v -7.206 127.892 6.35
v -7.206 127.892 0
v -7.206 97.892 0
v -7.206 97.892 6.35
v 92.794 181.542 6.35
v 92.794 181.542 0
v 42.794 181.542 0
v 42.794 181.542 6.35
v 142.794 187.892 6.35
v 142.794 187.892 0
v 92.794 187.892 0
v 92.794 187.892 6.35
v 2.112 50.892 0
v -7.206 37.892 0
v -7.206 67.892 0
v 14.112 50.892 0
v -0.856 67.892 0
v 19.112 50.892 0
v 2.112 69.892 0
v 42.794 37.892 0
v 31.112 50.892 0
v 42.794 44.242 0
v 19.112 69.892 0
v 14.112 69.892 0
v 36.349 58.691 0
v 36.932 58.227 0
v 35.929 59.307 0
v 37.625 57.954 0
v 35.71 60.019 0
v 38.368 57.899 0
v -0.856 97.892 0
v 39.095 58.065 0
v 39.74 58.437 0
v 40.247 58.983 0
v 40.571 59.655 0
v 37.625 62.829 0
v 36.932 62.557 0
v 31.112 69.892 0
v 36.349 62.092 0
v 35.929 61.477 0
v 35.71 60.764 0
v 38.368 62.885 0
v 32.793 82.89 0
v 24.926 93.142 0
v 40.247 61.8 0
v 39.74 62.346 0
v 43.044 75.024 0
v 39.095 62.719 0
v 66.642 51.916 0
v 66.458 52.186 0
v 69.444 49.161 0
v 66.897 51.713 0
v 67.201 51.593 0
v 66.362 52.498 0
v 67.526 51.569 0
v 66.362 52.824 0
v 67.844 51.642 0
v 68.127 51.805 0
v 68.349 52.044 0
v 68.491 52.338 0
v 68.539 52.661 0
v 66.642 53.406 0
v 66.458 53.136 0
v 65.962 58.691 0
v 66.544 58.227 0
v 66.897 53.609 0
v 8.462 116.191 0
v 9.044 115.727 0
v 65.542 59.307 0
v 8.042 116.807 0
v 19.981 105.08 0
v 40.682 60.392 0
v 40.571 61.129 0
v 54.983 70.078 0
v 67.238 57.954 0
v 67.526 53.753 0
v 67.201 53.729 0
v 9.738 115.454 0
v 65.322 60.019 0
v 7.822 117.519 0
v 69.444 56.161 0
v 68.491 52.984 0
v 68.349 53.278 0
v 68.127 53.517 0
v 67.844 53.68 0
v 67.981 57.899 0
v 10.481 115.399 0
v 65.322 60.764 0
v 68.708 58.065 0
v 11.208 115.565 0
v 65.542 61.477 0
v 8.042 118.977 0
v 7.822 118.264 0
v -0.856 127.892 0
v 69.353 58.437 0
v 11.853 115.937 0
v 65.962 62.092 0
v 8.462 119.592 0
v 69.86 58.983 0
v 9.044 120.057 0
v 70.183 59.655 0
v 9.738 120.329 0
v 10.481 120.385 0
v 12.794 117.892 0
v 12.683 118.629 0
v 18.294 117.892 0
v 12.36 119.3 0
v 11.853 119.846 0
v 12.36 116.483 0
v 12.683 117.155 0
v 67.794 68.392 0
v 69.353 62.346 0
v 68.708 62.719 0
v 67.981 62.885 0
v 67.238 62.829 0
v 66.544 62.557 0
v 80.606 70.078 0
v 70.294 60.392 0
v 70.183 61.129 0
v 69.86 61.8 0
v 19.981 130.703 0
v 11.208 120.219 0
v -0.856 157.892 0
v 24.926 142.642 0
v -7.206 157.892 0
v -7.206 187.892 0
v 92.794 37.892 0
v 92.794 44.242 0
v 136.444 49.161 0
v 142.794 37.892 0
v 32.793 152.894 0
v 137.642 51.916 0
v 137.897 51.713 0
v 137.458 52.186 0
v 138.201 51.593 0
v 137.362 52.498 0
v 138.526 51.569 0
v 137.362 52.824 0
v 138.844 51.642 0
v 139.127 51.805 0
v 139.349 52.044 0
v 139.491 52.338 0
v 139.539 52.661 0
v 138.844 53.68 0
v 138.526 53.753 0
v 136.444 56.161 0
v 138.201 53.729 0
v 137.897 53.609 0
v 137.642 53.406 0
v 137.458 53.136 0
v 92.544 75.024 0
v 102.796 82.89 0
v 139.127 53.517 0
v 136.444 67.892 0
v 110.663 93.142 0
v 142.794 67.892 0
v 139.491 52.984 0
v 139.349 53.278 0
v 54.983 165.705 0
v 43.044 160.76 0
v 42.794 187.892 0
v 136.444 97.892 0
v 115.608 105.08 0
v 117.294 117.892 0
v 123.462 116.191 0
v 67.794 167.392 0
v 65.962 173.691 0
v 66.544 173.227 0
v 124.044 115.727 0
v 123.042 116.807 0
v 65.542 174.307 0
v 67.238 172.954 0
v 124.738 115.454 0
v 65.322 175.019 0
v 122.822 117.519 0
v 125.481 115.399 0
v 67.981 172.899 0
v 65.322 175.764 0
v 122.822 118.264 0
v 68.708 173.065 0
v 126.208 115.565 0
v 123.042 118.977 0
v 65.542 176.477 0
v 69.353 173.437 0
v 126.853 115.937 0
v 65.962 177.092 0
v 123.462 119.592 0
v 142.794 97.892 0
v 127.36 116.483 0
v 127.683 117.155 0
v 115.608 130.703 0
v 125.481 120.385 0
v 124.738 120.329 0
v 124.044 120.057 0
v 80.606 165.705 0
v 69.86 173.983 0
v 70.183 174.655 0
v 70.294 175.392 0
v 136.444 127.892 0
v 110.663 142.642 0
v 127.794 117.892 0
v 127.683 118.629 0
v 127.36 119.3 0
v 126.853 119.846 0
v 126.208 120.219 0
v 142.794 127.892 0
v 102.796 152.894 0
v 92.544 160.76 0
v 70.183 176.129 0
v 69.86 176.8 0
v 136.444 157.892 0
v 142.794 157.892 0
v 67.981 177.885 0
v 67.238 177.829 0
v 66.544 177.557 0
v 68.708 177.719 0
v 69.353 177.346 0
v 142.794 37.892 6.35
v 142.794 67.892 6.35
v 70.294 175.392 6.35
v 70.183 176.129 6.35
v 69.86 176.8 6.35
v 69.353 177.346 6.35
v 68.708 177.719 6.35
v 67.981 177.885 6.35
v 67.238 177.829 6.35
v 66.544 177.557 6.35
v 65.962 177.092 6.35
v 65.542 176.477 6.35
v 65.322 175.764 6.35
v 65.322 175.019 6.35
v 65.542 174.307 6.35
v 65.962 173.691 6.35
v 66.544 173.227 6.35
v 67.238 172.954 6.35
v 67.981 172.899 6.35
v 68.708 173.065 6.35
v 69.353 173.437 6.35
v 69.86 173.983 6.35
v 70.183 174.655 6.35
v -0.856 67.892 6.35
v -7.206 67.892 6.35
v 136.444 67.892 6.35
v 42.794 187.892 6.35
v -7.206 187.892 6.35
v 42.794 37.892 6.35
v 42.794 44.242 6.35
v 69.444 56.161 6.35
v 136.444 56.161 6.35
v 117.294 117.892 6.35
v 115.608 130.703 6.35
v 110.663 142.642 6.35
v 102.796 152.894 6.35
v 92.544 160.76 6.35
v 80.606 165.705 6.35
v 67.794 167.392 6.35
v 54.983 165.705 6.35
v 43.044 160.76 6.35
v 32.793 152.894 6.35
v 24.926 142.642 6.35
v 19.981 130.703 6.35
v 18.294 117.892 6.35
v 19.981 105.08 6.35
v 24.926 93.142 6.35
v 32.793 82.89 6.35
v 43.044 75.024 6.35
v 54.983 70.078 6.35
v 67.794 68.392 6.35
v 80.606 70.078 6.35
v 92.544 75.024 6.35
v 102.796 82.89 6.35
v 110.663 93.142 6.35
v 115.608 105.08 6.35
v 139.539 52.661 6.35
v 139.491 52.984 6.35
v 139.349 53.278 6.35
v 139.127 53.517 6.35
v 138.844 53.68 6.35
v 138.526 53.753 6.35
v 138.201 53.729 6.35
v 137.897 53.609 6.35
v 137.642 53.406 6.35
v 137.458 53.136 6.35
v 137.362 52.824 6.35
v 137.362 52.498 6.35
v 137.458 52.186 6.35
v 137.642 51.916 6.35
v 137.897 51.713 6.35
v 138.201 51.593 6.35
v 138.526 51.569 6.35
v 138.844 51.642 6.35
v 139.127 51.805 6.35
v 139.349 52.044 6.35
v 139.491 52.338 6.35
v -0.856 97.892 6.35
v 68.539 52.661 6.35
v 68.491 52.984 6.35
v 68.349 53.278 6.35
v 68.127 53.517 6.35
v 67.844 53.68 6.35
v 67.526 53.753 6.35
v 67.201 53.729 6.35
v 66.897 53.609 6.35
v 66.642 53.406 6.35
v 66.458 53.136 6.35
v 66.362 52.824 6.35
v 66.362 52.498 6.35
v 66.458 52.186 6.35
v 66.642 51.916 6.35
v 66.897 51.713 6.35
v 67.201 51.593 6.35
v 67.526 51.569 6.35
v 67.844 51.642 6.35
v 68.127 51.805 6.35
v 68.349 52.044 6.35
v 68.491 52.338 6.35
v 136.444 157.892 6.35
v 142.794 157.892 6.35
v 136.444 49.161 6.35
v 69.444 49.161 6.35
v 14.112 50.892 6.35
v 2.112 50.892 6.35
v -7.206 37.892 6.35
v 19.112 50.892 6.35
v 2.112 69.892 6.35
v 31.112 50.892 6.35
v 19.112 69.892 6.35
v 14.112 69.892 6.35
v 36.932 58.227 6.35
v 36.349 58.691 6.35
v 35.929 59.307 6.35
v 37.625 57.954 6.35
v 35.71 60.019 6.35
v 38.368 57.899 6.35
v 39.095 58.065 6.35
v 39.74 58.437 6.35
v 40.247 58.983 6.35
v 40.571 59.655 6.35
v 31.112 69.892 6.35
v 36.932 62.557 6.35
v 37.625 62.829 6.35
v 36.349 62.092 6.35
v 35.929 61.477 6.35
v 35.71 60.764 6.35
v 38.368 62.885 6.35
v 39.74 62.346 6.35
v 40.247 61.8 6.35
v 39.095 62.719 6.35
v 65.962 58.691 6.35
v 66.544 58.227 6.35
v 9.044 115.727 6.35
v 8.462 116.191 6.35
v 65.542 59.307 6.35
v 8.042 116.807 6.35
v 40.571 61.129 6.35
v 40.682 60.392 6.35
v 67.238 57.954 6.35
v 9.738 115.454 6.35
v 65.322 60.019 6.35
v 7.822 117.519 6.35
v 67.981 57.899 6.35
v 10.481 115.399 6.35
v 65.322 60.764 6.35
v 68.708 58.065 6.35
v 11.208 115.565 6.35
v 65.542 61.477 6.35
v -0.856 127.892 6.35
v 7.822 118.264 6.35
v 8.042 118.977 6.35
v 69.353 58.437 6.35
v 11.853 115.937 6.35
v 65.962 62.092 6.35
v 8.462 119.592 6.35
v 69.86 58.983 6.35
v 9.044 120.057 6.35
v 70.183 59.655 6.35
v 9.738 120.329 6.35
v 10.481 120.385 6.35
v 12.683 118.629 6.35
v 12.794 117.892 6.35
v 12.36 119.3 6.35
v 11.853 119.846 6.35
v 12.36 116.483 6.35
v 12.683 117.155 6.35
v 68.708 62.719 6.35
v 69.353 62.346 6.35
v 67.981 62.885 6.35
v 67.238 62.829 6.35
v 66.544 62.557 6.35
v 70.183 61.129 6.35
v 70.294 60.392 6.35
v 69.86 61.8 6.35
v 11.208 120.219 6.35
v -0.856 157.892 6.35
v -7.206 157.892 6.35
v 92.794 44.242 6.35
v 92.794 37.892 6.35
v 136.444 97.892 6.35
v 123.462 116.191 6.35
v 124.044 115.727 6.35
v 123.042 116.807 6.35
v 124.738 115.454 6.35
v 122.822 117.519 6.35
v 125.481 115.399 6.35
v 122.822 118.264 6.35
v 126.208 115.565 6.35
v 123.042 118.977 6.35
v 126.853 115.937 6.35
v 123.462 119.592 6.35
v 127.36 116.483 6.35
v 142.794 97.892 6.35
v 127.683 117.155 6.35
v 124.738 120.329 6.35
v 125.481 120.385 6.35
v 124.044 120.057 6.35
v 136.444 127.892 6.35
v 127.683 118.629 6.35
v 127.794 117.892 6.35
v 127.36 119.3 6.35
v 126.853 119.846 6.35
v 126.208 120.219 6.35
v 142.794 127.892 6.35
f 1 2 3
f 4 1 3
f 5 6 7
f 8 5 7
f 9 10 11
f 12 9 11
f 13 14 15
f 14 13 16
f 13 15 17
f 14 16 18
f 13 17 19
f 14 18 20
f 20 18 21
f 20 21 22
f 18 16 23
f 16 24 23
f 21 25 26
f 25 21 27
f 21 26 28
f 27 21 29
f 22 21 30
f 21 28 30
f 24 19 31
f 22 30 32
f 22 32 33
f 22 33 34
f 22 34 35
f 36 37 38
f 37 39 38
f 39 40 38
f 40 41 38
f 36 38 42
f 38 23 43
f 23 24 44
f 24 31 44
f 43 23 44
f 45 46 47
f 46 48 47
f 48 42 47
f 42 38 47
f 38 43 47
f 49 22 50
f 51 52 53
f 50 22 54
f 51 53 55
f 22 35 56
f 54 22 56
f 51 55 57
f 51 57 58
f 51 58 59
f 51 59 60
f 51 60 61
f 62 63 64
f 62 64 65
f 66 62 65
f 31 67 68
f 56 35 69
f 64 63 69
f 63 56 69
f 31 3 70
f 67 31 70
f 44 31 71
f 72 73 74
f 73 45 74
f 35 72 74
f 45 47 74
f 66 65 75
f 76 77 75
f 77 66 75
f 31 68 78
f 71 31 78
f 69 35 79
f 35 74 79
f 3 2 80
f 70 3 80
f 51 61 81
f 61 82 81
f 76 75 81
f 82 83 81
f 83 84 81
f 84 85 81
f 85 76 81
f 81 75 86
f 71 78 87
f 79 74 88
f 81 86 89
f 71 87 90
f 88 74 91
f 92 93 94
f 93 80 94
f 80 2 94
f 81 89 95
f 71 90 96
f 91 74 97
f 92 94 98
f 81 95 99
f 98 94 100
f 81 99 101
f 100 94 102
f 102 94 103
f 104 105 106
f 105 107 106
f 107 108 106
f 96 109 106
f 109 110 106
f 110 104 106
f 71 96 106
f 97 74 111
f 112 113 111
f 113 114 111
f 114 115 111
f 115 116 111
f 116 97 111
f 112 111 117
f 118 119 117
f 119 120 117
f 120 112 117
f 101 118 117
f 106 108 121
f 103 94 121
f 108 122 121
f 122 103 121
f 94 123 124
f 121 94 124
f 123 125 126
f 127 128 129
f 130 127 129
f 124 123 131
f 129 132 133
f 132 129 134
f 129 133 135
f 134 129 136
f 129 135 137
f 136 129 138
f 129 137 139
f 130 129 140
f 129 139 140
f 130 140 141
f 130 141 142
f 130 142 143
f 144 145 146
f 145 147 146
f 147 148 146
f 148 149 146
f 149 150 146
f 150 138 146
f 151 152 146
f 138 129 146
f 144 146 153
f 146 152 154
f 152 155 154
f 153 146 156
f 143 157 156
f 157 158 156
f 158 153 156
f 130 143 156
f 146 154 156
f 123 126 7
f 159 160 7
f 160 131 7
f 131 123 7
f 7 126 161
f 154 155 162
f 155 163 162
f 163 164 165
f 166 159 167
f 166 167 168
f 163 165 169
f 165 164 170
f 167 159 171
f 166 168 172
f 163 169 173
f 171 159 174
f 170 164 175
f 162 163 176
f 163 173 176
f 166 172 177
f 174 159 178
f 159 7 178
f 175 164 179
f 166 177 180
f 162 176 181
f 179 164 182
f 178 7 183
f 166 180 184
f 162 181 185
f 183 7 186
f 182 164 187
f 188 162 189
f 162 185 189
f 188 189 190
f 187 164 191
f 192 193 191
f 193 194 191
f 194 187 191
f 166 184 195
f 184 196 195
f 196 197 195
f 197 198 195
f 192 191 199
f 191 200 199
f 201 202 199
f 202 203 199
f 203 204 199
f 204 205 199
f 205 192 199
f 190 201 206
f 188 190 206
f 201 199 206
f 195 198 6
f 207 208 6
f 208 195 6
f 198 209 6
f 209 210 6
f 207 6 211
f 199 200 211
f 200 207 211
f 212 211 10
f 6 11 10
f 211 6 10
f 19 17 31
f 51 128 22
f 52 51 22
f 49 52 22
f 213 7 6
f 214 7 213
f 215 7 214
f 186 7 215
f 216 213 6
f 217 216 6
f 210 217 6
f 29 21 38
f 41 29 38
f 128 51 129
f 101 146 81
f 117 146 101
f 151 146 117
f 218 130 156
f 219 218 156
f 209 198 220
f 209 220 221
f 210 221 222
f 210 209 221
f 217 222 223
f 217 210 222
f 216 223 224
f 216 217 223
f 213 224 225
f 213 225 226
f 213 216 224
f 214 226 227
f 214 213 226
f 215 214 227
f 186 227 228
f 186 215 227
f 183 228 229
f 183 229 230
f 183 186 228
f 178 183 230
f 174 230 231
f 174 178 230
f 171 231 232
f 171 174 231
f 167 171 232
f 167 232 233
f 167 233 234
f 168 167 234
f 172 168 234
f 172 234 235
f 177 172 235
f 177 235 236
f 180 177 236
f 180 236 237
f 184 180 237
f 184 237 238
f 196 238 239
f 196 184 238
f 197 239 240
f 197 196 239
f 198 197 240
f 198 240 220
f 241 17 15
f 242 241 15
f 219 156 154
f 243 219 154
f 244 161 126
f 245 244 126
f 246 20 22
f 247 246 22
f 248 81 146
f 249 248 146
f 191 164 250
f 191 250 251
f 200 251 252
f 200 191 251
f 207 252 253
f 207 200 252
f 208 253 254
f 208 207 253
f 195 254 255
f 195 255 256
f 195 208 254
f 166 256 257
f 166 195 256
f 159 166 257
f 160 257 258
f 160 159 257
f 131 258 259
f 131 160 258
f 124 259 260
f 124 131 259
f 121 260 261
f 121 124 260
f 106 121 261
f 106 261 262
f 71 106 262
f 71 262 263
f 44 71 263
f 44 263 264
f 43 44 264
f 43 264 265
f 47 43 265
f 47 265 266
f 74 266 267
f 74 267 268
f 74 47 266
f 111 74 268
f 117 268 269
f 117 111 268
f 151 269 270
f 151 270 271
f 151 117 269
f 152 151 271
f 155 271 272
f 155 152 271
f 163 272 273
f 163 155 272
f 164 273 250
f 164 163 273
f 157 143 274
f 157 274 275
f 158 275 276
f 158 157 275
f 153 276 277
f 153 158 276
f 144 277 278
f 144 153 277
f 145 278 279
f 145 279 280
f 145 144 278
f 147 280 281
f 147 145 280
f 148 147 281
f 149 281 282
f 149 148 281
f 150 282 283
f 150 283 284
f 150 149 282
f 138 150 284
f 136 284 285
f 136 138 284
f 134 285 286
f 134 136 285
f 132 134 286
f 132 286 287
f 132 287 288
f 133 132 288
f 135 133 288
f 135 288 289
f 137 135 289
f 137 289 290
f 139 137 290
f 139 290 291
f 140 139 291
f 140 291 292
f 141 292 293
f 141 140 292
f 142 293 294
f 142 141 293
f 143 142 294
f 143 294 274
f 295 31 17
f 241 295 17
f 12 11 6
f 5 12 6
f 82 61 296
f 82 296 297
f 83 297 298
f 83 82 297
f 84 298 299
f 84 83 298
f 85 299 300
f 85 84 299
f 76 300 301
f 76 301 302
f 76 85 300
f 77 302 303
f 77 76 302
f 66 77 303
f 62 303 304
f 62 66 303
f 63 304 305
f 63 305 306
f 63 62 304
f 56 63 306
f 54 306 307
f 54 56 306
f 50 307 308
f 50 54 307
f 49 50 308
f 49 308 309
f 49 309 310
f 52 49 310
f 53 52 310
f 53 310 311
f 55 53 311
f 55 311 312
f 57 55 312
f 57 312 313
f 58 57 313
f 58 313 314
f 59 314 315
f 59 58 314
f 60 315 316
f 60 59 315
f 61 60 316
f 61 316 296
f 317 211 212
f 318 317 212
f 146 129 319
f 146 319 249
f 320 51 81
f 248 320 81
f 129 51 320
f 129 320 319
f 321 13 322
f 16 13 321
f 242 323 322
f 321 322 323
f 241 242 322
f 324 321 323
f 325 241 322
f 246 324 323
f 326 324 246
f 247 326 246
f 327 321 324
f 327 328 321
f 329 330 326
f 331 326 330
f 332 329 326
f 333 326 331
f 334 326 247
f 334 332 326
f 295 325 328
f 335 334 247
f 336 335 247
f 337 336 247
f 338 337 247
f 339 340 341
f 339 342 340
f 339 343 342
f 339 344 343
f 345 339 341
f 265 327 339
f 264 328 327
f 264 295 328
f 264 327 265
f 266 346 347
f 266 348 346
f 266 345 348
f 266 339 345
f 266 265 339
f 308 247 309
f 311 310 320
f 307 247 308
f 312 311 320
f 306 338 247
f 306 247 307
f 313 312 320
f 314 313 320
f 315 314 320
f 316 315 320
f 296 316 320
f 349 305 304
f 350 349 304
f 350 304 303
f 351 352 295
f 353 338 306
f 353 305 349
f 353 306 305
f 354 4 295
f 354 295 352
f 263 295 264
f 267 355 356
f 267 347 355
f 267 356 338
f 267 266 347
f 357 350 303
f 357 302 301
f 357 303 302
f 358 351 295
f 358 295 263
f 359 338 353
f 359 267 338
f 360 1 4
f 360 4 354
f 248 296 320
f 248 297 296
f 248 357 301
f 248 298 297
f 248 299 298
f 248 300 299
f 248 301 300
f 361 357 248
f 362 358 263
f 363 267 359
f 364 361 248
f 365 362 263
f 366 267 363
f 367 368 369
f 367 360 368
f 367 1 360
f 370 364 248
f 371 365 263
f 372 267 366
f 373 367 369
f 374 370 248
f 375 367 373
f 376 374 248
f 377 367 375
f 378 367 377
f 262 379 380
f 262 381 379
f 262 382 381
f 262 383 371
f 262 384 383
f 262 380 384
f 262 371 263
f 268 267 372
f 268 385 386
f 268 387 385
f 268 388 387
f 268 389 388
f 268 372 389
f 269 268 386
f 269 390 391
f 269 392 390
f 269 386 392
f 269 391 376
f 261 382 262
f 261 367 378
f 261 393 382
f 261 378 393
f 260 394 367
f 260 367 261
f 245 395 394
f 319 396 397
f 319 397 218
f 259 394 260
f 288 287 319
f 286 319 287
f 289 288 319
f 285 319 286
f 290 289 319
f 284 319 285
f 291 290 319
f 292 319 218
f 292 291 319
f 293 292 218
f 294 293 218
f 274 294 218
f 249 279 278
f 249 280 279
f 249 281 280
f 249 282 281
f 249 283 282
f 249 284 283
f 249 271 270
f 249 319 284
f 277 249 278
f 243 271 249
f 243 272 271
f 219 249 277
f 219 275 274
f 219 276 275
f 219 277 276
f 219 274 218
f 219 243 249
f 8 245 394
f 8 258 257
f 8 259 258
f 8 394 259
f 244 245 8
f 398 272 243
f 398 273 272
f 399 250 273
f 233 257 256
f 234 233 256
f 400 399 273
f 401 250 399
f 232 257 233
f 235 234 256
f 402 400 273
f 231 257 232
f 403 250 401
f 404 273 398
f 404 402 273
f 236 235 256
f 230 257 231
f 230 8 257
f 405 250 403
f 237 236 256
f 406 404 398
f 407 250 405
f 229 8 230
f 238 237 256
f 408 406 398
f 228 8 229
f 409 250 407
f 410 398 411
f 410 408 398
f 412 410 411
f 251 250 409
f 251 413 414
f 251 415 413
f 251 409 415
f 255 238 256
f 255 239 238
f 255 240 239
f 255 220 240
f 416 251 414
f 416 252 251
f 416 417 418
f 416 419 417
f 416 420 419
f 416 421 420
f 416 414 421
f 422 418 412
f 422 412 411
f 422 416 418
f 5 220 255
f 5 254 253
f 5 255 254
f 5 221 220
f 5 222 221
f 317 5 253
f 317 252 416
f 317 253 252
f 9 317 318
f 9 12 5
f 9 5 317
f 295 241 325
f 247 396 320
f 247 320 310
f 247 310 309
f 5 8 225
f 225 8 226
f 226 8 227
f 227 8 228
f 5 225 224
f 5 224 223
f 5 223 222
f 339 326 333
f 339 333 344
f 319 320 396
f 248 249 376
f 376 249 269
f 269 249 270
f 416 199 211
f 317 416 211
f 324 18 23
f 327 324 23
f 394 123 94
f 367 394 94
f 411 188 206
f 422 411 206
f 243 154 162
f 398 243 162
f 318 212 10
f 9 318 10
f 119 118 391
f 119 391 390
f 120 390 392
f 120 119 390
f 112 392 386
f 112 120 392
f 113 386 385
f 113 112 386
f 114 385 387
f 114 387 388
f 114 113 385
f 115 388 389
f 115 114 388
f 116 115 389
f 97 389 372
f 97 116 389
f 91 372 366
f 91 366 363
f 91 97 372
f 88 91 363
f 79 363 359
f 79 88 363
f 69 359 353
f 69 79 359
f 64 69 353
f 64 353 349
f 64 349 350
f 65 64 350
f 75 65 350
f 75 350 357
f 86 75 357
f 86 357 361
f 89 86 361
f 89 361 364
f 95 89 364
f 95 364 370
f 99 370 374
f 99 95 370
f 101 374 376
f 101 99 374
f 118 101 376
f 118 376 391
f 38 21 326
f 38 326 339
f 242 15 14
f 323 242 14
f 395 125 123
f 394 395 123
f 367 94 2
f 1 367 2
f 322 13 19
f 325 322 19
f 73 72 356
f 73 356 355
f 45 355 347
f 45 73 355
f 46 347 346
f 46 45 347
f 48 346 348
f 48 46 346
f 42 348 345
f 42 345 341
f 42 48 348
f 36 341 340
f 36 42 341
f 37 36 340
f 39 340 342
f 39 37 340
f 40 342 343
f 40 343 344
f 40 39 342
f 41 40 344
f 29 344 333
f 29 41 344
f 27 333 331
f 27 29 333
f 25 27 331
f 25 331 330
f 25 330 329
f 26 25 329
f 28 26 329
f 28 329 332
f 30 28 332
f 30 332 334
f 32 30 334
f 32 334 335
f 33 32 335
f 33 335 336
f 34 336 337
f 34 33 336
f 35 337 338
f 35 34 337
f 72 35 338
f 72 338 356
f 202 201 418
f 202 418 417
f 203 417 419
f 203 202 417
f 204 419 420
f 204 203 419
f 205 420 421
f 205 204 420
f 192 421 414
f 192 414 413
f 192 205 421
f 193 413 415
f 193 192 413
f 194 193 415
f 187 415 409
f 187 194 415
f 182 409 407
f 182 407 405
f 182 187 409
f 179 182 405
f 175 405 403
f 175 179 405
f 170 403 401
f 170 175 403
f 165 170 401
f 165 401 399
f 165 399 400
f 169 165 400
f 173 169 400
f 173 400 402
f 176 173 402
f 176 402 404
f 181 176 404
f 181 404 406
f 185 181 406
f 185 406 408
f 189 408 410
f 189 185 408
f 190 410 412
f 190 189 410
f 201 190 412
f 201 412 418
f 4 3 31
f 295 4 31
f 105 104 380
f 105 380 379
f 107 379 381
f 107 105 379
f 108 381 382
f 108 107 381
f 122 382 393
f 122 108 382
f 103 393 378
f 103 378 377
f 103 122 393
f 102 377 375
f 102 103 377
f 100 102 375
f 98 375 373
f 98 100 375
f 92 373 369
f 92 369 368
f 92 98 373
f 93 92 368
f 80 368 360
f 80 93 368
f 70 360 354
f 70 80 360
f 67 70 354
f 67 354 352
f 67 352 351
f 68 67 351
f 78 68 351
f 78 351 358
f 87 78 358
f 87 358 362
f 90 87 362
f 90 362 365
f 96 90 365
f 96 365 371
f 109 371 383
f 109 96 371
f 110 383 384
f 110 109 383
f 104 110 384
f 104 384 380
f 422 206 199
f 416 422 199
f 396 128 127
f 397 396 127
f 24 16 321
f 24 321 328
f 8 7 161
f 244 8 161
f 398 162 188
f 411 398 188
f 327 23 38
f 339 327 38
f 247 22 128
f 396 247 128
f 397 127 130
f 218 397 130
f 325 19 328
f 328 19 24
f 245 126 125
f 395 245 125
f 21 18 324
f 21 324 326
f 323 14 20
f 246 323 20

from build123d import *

# Parameters (mm, degrees)
SKETCH2_R           = 49.5
SKETCH2_R_2         = 2.5
SKETCH2_R_3         = 1.095
SKETCH2_W           = 12
SKETCH2_H           = 19
SKETCH2_W_2         = 67
SKETCH2_H_2         = 7
BOSS_EXTRUDE1_DEPTH = 6.35


with BuildPart() as part:
    # Sketch2 → Boss-Extrude1 (new body)
    with BuildSketch(Plane.XY):
        Polygon((-7.205623902, 187.891798144), (-7.205623902, 157.891798144), (-0.855623902, 157.891798144), (-0.855623902, 127.891798144), (-7.205623902, 127.891798144), (-7.205623902, 97.891798144), (-0.855623902, 97.891798144), (-0.855623902, 67.891798144), (-7.205623902, 67.891798144), (-7.205623902, 37.891798144), (42.794376098, 37.891798144), (42.794376098, 44.241798144), (92.794376098, 44.241798144), (92.794376098, 37.891798144), (142.794376098, 37.891798144), (142.794376098, 67.891798144), (136.444376098, 67.891798144), (136.444376098, 97.891798144), (142.794376098, 97.891798144), (142.794376098, 127.891798144), (136.444376098, 127.891798144), (136.444376098, 157.891798144), (142.794376098, 157.891798144), (142.794376098, 187.891798144), (92.794376098, 187.891798144), (92.794376098, 181.541798144), (42.794376098, 181.541798144), (42.794376098, 187.891798144), align=None)
        with Locations((67.794376098, 117.891798144)):
            Circle(SKETCH2_R, mode=Mode.SUBTRACT)
        with Locations((38.181618431, 60.391798144)):
            Circle(SKETCH2_R_2, mode=Mode.SUBTRACT)
        with Locations((10.294376098, 117.891798144)):
            Circle(SKETCH2_R_2, mode=Mode.SUBTRACT)
        with Locations((67.794376098, 60.391798144)):
            Circle(SKETCH2_R_2, mode=Mode.SUBTRACT)
        with Locations((125.294376098, 117.891798144)):
            Circle(SKETCH2_R_2, mode=Mode.SUBTRACT)
        with Locations((67.794376098, 175.391798144)):
            Circle(SKETCH2_R_2, mode=Mode.SUBTRACT)
        with Locations((67.444376098, 52.660955737)):
            Circle(SKETCH2_R_3, mode=Mode.SUBTRACT)
        with Locations((138.444376098, 52.660955737)):
            Circle(SKETCH2_R_3, mode=Mode.SUBTRACT)
        with Locations((25.111805458, 60.391798144)):
            Rectangle(SKETCH2_W, SKETCH2_H, mode=Mode.SUBTRACT)
        with Locations((8.111805458, 60.391798144)):
            Rectangle(SKETCH2_W, SKETCH2_H, mode=Mode.SUBTRACT)
        with Locations((102.944376098, 52.660955737)):
            Rectangle(SKETCH2_W_2, SKETCH2_H_2, mode=Mode.SUBTRACT)
    extrude(amount=BOSS_EXTRUDE1_DEPTH)


solid = part.part
